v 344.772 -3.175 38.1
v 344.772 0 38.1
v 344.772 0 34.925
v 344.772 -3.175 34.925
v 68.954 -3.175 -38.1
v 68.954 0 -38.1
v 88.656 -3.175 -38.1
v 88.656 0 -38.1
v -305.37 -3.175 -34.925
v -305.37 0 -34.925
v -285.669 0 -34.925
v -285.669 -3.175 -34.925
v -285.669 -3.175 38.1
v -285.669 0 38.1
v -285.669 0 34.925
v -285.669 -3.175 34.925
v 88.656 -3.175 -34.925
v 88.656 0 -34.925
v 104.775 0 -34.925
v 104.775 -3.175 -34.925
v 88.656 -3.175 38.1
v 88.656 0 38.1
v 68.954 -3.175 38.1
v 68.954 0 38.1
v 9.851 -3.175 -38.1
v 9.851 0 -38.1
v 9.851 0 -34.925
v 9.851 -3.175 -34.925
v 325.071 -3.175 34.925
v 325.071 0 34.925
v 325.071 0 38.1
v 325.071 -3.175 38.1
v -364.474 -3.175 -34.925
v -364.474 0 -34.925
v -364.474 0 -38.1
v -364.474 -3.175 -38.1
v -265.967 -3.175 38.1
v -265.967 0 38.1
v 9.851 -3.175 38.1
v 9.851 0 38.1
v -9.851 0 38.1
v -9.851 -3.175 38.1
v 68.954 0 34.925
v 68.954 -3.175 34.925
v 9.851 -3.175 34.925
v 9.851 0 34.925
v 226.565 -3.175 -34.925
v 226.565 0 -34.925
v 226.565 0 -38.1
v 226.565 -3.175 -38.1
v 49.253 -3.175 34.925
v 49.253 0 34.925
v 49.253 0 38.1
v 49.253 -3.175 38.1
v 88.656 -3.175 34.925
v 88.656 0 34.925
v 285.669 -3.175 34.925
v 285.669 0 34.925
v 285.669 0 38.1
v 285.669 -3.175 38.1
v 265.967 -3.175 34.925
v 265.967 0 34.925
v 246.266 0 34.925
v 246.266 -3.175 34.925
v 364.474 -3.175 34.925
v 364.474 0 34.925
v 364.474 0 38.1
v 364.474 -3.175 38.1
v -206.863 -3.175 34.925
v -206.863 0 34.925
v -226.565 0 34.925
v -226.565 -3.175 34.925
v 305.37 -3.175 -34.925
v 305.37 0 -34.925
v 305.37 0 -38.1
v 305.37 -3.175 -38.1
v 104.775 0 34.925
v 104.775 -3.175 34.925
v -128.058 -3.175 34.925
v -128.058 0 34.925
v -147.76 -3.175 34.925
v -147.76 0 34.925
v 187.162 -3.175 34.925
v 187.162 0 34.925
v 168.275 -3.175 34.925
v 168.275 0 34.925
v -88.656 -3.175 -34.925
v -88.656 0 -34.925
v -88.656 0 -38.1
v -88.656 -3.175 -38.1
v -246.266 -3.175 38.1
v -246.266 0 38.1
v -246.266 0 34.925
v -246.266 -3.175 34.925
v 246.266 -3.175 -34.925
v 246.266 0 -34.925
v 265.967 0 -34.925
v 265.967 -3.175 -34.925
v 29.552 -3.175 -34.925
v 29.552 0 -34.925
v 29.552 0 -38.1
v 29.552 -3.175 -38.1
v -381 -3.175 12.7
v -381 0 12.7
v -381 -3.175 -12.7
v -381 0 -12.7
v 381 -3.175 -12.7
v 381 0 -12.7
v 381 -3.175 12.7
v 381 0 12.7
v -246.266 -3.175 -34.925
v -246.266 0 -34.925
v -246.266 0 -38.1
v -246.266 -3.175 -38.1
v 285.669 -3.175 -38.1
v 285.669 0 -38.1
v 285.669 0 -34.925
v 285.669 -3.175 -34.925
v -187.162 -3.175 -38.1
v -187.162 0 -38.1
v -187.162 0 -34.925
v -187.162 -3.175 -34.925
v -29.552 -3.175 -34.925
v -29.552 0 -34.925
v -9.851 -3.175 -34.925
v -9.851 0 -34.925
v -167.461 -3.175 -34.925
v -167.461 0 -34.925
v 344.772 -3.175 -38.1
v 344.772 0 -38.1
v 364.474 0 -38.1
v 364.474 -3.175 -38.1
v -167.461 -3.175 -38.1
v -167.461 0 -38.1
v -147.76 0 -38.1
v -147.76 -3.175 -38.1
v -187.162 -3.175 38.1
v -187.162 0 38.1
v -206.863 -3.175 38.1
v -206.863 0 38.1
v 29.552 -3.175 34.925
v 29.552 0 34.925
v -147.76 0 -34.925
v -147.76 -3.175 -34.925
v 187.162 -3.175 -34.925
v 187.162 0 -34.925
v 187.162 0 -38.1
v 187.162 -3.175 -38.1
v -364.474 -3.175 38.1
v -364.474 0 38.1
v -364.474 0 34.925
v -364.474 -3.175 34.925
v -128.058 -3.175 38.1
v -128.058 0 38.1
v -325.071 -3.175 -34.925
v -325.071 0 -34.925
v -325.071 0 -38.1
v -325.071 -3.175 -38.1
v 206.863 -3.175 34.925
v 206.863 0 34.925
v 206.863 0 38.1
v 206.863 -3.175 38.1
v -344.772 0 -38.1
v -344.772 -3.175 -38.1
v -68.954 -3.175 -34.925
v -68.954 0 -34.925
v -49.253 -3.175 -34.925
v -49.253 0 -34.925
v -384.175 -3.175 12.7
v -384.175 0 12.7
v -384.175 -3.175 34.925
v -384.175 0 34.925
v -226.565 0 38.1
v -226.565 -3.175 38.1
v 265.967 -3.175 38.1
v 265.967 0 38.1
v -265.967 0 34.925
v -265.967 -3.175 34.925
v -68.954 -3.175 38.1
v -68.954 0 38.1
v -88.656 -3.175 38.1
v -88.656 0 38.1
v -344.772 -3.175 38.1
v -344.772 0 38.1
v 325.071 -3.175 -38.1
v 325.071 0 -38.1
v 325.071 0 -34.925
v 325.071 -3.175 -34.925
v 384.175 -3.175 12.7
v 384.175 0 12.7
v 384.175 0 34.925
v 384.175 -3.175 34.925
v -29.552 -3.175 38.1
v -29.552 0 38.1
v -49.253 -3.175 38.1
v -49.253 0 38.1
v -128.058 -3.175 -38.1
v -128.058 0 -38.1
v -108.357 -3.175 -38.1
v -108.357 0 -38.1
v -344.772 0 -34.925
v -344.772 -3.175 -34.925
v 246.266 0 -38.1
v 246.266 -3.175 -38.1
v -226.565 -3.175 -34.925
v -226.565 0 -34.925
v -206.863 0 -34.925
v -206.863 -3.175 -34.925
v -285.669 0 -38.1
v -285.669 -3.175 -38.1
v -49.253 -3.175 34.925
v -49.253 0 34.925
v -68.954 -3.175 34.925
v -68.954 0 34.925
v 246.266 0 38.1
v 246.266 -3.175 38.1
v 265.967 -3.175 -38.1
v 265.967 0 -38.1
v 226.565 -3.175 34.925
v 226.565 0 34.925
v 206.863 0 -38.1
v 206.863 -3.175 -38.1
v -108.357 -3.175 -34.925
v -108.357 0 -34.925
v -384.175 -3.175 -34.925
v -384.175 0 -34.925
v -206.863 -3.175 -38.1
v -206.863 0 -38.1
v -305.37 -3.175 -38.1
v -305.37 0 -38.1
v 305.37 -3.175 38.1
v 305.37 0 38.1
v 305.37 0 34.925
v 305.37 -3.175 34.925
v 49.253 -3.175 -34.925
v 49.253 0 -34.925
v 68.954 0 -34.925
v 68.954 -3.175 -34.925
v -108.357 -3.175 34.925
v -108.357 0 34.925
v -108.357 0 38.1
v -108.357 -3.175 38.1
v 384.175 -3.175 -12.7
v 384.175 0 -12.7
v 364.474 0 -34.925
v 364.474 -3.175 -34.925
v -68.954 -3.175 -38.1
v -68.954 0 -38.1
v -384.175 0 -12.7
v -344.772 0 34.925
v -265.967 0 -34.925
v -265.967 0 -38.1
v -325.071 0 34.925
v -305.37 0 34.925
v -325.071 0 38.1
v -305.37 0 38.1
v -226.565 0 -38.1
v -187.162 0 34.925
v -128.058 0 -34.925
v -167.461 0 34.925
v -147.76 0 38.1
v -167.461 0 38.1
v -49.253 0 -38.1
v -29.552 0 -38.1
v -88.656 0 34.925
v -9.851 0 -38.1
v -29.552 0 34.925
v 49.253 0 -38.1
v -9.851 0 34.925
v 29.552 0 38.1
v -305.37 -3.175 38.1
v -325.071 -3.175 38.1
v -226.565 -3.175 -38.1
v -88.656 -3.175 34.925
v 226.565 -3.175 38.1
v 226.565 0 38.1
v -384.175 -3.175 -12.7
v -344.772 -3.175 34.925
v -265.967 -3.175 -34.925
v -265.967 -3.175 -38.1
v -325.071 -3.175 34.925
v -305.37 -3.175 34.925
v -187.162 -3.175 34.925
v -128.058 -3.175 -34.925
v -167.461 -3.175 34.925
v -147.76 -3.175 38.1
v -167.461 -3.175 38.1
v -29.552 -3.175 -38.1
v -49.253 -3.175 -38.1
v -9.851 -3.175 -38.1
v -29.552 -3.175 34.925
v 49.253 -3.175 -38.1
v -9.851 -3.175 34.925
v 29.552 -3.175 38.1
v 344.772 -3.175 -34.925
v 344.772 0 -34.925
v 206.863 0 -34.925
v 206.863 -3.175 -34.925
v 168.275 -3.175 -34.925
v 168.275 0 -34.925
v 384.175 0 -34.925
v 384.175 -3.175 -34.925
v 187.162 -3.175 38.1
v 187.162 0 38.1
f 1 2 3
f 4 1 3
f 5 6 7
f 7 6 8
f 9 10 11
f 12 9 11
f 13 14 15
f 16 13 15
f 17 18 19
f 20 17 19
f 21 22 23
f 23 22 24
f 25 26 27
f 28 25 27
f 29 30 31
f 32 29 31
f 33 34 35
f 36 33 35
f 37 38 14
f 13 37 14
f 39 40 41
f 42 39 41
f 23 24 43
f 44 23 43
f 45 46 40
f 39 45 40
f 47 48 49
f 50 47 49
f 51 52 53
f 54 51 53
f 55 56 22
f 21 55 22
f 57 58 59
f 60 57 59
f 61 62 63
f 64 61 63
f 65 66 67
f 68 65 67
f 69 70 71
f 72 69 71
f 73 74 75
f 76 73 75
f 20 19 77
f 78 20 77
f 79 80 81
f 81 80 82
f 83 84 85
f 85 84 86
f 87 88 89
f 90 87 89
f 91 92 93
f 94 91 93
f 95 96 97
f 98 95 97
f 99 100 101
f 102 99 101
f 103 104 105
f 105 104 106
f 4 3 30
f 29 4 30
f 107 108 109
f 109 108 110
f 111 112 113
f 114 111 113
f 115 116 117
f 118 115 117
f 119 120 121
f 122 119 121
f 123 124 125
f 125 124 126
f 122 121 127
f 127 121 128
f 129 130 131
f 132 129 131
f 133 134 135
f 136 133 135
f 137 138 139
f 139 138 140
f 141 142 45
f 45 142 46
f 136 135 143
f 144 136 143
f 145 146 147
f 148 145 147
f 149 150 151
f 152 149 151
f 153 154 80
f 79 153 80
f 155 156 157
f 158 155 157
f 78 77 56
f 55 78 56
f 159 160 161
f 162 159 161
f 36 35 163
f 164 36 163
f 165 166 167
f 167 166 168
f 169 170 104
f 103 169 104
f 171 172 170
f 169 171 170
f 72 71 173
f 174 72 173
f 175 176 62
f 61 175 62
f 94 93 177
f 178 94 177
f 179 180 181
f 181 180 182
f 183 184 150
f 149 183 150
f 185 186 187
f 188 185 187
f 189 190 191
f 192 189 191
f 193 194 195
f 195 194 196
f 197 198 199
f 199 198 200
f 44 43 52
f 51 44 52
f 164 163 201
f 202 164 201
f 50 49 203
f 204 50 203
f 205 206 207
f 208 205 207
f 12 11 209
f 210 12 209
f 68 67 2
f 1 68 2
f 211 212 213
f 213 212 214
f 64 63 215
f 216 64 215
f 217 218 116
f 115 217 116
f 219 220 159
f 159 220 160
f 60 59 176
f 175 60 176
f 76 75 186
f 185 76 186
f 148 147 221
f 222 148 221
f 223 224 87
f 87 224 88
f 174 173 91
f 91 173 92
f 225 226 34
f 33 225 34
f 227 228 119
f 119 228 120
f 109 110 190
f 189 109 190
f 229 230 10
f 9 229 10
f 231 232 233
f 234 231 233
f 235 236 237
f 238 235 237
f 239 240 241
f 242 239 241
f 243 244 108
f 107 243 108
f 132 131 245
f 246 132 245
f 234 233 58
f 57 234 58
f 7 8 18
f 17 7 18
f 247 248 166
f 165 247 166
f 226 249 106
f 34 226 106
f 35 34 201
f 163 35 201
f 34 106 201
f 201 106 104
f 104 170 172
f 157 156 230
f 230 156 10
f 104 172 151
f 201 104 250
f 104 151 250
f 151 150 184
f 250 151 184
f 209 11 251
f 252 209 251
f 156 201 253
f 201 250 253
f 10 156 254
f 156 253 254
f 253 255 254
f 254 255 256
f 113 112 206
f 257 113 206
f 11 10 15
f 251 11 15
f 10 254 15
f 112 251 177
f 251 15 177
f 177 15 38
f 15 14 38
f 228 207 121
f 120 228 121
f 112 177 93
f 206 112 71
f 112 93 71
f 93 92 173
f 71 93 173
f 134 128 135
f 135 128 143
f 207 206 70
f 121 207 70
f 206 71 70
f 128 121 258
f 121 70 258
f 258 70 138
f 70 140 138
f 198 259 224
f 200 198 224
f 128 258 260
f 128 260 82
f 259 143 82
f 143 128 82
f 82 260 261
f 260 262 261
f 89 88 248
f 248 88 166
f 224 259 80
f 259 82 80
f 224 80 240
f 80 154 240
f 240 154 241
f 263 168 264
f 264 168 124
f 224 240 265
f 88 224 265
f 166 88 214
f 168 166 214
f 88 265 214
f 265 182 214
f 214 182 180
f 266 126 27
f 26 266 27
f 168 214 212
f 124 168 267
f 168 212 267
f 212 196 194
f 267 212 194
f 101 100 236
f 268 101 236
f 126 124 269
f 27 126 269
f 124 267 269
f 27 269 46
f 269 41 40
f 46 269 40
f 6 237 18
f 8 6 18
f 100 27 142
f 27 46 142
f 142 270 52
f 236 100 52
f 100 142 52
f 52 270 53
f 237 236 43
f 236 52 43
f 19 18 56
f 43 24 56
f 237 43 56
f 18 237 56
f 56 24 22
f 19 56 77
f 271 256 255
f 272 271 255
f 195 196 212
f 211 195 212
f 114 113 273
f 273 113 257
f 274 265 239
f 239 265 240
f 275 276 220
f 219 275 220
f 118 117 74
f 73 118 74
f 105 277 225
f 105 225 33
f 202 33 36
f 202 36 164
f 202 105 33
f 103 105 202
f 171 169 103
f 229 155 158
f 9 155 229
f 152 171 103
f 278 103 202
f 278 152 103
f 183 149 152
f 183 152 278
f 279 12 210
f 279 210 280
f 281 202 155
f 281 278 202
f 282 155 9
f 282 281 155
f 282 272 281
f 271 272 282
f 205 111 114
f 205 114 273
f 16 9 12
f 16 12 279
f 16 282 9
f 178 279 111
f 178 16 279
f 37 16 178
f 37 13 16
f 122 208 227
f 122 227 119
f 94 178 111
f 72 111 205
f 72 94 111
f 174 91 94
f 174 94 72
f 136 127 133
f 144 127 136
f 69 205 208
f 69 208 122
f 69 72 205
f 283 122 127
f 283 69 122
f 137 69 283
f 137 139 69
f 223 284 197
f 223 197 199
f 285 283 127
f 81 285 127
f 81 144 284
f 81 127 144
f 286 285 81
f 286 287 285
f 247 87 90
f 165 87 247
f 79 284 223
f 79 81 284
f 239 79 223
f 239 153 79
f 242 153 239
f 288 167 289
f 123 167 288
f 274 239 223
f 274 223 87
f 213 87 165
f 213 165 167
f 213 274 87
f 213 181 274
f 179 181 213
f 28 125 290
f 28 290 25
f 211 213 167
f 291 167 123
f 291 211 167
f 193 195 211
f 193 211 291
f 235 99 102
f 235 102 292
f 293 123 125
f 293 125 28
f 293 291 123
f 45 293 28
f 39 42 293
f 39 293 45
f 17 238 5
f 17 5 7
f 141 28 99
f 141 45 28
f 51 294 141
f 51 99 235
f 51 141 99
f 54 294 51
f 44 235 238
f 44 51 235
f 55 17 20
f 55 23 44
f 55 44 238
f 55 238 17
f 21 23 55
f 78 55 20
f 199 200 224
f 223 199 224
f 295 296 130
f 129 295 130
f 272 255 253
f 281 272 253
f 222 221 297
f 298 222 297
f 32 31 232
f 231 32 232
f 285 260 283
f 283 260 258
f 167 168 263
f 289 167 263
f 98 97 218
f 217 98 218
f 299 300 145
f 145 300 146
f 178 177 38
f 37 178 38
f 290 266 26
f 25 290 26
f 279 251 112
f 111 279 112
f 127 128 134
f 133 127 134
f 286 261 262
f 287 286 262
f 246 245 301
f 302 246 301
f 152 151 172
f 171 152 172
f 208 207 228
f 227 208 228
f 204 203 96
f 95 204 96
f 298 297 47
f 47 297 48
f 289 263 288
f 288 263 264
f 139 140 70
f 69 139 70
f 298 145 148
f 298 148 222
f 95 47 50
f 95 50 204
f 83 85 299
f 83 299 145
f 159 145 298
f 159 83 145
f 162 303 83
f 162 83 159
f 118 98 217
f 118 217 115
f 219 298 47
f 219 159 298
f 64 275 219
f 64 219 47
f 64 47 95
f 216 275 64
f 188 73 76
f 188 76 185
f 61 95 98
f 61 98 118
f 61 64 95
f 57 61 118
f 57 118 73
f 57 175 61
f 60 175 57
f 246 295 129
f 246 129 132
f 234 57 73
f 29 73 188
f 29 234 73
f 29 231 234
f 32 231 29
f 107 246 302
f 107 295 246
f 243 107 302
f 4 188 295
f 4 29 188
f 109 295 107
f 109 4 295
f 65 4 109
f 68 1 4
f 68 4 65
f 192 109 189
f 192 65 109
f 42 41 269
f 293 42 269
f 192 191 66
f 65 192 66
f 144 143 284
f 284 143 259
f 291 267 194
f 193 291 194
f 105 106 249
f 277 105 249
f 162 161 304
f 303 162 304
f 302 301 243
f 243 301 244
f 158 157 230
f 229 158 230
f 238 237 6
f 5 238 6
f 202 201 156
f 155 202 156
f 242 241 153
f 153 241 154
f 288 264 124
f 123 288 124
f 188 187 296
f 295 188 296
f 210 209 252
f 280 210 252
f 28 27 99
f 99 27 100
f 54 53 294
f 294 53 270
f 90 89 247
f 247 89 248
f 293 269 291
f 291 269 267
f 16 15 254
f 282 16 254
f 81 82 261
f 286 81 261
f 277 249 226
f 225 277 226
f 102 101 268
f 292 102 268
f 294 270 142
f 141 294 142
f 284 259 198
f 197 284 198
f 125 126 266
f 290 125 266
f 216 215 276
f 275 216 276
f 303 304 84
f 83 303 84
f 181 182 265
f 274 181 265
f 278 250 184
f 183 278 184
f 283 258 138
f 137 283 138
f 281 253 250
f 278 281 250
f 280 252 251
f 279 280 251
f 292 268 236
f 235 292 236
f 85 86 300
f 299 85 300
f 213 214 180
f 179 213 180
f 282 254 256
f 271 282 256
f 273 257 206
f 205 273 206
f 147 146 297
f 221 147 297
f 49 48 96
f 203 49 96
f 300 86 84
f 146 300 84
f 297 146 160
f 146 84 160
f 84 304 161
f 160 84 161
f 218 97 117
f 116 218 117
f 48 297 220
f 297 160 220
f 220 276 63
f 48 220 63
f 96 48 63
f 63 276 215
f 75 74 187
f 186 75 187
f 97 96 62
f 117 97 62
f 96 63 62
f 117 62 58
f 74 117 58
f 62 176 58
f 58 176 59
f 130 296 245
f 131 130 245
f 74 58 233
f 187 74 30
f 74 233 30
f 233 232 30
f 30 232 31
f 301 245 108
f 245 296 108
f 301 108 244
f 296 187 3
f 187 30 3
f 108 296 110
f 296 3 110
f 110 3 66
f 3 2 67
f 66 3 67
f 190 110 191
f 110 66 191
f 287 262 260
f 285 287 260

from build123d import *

# Parameters (mm, degrees)
F1_DEPTH = 3.175


# Not quite as in the source:
# - ends of sketch curves that miss each other by under 0.0002 mm in the source are joined


with BuildPart() as f1:
    # F0 (on Front) → F1 (new body)
    with BuildSketch(Plane.XZ):
        Polygon((-384.175, 34.925), (-384.175, 12.7), (-381, 12.7), (-381, -12.7), (-384.175, -12.7), (-384.175, -34.925), (-364.473717838, -34.925), (-364.473717838, -38.1), (-344.772435676, -38.1), (-344.772435676, -34.925), (-325.071153514, -34.925), (-325.071153514, -38.1), (-305.369871352, -38.1), (-305.369871352, -34.925), (-285.66858919, -34.925), (-285.66858919, -38.1), (-265.967307028, -38.1), (-265.967307028, -34.925), (-246.266024866, -34.925), (-246.266024866, -38.1), (-226.564742704, -38.1), (-226.564742704, -34.925), (-206.863460542, -34.925), (-206.863460542, -38.1), (-187.16217838, -38.1), (-187.16217838, -34.925), (-167.460896218, -34.925), (-167.460896218, -38.1), (-147.759614056, -38.1), (-147.759614056, -34.925), (-128.058331894, -34.925), (-128.058331894, -38.1), (-108.357049732, -38.1), (-108.357049732, -34.925), (-88.65576757, -34.925), (-88.65576757, -38.1), (-68.954485408, -38.1), (-68.954485408, -34.925), (-49.253203246, -34.925), (-49.253203246, -38.1), (-29.551921084, -38.1), (-29.551921084, -34.925), (-9.850638922, -34.925), (-9.850638922, -38.1), (9.85064324, -38.1), (9.85064324, -34.925), (29.551925402, -34.925), (29.551925402, -38.1), (49.253207564, -38.1), (49.253207564, -34.925), (68.954489726, -34.925), (68.954489726, -38.1), (88.655771888, -38.1), (88.655771888, -34.925), (104.775, -34.925), (104.775, 34.925), (88.655771888, 34.925), (88.655771888, 38.1), (68.954489726, 38.1), (68.954489726, 34.925), (49.253207564, 34.925), (49.253207564, 38.1), (29.551925402, 38.1), (29.551925402, 34.925), (9.85064324, 34.925), (9.85064324, 38.1), (-9.850638922, 38.1), (-9.850638922, 34.925), (-29.551921084, 34.925), (-29.551921084, 38.1), (-49.253203246, 38.1), (-49.253203246, 34.925), (-68.954485408, 34.925), (-68.954485408, 38.1), (-88.65576757, 38.1), (-88.65576757, 34.925), (-108.357049732, 34.925), (-108.357049732, 38.1), (-128.058331894, 38.1), (-128.058331894, 34.925), (-147.759614056, 34.925), (-147.759614056, 38.1), (-167.460896218, 38.1), (-167.460896218, 34.925), (-187.16217838, 34.925), (-187.16217838, 38.1), (-206.863460542, 38.1), (-206.863460542, 34.925), (-226.564742704, 34.925), (-226.564742704, 38.1), (-246.266024866, 38.1), (-246.266024866, 34.925), (-265.967307028, 34.925), (-265.967307028, 38.1), (-285.66858919, 38.1), (-285.66858919, 34.925), (-305.369871352, 34.925), (-305.369871352, 38.1), (-325.071153514, 38.1), (-325.071153514, 34.925), (-344.772435676, 34.925), (-344.772435676, 38.1), (-364.473717838, 38.1), (-364.473717838, 34.925), align=None)
    extrude(amount=F1_DEPTH)


with BuildPart() as f1b:
    # F0 (on Front) → F1, piece 2 (new body)
    with BuildSketch(Plane.XZ):
        Polygon((187.162182698, 34.925), (168.275, 34.925), (168.275, -34.925), (187.162182698, -34.925), (187.162182698, -38.1), (206.86346486, -38.1), (206.86346486, -34.925), (226.564747022, -34.925), (226.564747022, -38.1), (246.266029184, -38.1), (246.266029184, -34.925), (265.967311346, -34.925), (265.967311346, -38.1), (285.668593508, -38.1), (285.668593508, -34.925), (305.36987567, -34.925), (305.36987567, -38.1), (325.071157832, -38.1), (325.071157832, -34.925), (344.772439994, -34.925), (344.772439994, -38.1), (364.473722156, -38.1), (364.473722156, -34.925), (384.175004318, -34.925), (384.175, -12.7), (381, -12.7), (381, 12.7), (384.175, 12.7), (384.175, 34.925), (364.473722156, 34.925), (364.473722156, 38.1), (344.772439994, 38.1), (344.772439994, 34.925), (325.071157832, 34.925), (325.071157832, 38.1), (305.36987567, 38.1), (305.36987567, 34.925), (285.668593508, 34.925), (285.668593508, 38.1), (265.967311346, 38.1), (265.967311346, 34.925), (246.266029184, 34.925), (246.266029184, 38.1), (226.564747022, 38.1), (226.564747022, 34.925), (206.86346486, 34.925), (206.86346486, 38.1), (187.162182698, 38.1), align=None)
    extrude(amount=F1_DEPTH)


solid = Compound([f1.part, f1b.part])
